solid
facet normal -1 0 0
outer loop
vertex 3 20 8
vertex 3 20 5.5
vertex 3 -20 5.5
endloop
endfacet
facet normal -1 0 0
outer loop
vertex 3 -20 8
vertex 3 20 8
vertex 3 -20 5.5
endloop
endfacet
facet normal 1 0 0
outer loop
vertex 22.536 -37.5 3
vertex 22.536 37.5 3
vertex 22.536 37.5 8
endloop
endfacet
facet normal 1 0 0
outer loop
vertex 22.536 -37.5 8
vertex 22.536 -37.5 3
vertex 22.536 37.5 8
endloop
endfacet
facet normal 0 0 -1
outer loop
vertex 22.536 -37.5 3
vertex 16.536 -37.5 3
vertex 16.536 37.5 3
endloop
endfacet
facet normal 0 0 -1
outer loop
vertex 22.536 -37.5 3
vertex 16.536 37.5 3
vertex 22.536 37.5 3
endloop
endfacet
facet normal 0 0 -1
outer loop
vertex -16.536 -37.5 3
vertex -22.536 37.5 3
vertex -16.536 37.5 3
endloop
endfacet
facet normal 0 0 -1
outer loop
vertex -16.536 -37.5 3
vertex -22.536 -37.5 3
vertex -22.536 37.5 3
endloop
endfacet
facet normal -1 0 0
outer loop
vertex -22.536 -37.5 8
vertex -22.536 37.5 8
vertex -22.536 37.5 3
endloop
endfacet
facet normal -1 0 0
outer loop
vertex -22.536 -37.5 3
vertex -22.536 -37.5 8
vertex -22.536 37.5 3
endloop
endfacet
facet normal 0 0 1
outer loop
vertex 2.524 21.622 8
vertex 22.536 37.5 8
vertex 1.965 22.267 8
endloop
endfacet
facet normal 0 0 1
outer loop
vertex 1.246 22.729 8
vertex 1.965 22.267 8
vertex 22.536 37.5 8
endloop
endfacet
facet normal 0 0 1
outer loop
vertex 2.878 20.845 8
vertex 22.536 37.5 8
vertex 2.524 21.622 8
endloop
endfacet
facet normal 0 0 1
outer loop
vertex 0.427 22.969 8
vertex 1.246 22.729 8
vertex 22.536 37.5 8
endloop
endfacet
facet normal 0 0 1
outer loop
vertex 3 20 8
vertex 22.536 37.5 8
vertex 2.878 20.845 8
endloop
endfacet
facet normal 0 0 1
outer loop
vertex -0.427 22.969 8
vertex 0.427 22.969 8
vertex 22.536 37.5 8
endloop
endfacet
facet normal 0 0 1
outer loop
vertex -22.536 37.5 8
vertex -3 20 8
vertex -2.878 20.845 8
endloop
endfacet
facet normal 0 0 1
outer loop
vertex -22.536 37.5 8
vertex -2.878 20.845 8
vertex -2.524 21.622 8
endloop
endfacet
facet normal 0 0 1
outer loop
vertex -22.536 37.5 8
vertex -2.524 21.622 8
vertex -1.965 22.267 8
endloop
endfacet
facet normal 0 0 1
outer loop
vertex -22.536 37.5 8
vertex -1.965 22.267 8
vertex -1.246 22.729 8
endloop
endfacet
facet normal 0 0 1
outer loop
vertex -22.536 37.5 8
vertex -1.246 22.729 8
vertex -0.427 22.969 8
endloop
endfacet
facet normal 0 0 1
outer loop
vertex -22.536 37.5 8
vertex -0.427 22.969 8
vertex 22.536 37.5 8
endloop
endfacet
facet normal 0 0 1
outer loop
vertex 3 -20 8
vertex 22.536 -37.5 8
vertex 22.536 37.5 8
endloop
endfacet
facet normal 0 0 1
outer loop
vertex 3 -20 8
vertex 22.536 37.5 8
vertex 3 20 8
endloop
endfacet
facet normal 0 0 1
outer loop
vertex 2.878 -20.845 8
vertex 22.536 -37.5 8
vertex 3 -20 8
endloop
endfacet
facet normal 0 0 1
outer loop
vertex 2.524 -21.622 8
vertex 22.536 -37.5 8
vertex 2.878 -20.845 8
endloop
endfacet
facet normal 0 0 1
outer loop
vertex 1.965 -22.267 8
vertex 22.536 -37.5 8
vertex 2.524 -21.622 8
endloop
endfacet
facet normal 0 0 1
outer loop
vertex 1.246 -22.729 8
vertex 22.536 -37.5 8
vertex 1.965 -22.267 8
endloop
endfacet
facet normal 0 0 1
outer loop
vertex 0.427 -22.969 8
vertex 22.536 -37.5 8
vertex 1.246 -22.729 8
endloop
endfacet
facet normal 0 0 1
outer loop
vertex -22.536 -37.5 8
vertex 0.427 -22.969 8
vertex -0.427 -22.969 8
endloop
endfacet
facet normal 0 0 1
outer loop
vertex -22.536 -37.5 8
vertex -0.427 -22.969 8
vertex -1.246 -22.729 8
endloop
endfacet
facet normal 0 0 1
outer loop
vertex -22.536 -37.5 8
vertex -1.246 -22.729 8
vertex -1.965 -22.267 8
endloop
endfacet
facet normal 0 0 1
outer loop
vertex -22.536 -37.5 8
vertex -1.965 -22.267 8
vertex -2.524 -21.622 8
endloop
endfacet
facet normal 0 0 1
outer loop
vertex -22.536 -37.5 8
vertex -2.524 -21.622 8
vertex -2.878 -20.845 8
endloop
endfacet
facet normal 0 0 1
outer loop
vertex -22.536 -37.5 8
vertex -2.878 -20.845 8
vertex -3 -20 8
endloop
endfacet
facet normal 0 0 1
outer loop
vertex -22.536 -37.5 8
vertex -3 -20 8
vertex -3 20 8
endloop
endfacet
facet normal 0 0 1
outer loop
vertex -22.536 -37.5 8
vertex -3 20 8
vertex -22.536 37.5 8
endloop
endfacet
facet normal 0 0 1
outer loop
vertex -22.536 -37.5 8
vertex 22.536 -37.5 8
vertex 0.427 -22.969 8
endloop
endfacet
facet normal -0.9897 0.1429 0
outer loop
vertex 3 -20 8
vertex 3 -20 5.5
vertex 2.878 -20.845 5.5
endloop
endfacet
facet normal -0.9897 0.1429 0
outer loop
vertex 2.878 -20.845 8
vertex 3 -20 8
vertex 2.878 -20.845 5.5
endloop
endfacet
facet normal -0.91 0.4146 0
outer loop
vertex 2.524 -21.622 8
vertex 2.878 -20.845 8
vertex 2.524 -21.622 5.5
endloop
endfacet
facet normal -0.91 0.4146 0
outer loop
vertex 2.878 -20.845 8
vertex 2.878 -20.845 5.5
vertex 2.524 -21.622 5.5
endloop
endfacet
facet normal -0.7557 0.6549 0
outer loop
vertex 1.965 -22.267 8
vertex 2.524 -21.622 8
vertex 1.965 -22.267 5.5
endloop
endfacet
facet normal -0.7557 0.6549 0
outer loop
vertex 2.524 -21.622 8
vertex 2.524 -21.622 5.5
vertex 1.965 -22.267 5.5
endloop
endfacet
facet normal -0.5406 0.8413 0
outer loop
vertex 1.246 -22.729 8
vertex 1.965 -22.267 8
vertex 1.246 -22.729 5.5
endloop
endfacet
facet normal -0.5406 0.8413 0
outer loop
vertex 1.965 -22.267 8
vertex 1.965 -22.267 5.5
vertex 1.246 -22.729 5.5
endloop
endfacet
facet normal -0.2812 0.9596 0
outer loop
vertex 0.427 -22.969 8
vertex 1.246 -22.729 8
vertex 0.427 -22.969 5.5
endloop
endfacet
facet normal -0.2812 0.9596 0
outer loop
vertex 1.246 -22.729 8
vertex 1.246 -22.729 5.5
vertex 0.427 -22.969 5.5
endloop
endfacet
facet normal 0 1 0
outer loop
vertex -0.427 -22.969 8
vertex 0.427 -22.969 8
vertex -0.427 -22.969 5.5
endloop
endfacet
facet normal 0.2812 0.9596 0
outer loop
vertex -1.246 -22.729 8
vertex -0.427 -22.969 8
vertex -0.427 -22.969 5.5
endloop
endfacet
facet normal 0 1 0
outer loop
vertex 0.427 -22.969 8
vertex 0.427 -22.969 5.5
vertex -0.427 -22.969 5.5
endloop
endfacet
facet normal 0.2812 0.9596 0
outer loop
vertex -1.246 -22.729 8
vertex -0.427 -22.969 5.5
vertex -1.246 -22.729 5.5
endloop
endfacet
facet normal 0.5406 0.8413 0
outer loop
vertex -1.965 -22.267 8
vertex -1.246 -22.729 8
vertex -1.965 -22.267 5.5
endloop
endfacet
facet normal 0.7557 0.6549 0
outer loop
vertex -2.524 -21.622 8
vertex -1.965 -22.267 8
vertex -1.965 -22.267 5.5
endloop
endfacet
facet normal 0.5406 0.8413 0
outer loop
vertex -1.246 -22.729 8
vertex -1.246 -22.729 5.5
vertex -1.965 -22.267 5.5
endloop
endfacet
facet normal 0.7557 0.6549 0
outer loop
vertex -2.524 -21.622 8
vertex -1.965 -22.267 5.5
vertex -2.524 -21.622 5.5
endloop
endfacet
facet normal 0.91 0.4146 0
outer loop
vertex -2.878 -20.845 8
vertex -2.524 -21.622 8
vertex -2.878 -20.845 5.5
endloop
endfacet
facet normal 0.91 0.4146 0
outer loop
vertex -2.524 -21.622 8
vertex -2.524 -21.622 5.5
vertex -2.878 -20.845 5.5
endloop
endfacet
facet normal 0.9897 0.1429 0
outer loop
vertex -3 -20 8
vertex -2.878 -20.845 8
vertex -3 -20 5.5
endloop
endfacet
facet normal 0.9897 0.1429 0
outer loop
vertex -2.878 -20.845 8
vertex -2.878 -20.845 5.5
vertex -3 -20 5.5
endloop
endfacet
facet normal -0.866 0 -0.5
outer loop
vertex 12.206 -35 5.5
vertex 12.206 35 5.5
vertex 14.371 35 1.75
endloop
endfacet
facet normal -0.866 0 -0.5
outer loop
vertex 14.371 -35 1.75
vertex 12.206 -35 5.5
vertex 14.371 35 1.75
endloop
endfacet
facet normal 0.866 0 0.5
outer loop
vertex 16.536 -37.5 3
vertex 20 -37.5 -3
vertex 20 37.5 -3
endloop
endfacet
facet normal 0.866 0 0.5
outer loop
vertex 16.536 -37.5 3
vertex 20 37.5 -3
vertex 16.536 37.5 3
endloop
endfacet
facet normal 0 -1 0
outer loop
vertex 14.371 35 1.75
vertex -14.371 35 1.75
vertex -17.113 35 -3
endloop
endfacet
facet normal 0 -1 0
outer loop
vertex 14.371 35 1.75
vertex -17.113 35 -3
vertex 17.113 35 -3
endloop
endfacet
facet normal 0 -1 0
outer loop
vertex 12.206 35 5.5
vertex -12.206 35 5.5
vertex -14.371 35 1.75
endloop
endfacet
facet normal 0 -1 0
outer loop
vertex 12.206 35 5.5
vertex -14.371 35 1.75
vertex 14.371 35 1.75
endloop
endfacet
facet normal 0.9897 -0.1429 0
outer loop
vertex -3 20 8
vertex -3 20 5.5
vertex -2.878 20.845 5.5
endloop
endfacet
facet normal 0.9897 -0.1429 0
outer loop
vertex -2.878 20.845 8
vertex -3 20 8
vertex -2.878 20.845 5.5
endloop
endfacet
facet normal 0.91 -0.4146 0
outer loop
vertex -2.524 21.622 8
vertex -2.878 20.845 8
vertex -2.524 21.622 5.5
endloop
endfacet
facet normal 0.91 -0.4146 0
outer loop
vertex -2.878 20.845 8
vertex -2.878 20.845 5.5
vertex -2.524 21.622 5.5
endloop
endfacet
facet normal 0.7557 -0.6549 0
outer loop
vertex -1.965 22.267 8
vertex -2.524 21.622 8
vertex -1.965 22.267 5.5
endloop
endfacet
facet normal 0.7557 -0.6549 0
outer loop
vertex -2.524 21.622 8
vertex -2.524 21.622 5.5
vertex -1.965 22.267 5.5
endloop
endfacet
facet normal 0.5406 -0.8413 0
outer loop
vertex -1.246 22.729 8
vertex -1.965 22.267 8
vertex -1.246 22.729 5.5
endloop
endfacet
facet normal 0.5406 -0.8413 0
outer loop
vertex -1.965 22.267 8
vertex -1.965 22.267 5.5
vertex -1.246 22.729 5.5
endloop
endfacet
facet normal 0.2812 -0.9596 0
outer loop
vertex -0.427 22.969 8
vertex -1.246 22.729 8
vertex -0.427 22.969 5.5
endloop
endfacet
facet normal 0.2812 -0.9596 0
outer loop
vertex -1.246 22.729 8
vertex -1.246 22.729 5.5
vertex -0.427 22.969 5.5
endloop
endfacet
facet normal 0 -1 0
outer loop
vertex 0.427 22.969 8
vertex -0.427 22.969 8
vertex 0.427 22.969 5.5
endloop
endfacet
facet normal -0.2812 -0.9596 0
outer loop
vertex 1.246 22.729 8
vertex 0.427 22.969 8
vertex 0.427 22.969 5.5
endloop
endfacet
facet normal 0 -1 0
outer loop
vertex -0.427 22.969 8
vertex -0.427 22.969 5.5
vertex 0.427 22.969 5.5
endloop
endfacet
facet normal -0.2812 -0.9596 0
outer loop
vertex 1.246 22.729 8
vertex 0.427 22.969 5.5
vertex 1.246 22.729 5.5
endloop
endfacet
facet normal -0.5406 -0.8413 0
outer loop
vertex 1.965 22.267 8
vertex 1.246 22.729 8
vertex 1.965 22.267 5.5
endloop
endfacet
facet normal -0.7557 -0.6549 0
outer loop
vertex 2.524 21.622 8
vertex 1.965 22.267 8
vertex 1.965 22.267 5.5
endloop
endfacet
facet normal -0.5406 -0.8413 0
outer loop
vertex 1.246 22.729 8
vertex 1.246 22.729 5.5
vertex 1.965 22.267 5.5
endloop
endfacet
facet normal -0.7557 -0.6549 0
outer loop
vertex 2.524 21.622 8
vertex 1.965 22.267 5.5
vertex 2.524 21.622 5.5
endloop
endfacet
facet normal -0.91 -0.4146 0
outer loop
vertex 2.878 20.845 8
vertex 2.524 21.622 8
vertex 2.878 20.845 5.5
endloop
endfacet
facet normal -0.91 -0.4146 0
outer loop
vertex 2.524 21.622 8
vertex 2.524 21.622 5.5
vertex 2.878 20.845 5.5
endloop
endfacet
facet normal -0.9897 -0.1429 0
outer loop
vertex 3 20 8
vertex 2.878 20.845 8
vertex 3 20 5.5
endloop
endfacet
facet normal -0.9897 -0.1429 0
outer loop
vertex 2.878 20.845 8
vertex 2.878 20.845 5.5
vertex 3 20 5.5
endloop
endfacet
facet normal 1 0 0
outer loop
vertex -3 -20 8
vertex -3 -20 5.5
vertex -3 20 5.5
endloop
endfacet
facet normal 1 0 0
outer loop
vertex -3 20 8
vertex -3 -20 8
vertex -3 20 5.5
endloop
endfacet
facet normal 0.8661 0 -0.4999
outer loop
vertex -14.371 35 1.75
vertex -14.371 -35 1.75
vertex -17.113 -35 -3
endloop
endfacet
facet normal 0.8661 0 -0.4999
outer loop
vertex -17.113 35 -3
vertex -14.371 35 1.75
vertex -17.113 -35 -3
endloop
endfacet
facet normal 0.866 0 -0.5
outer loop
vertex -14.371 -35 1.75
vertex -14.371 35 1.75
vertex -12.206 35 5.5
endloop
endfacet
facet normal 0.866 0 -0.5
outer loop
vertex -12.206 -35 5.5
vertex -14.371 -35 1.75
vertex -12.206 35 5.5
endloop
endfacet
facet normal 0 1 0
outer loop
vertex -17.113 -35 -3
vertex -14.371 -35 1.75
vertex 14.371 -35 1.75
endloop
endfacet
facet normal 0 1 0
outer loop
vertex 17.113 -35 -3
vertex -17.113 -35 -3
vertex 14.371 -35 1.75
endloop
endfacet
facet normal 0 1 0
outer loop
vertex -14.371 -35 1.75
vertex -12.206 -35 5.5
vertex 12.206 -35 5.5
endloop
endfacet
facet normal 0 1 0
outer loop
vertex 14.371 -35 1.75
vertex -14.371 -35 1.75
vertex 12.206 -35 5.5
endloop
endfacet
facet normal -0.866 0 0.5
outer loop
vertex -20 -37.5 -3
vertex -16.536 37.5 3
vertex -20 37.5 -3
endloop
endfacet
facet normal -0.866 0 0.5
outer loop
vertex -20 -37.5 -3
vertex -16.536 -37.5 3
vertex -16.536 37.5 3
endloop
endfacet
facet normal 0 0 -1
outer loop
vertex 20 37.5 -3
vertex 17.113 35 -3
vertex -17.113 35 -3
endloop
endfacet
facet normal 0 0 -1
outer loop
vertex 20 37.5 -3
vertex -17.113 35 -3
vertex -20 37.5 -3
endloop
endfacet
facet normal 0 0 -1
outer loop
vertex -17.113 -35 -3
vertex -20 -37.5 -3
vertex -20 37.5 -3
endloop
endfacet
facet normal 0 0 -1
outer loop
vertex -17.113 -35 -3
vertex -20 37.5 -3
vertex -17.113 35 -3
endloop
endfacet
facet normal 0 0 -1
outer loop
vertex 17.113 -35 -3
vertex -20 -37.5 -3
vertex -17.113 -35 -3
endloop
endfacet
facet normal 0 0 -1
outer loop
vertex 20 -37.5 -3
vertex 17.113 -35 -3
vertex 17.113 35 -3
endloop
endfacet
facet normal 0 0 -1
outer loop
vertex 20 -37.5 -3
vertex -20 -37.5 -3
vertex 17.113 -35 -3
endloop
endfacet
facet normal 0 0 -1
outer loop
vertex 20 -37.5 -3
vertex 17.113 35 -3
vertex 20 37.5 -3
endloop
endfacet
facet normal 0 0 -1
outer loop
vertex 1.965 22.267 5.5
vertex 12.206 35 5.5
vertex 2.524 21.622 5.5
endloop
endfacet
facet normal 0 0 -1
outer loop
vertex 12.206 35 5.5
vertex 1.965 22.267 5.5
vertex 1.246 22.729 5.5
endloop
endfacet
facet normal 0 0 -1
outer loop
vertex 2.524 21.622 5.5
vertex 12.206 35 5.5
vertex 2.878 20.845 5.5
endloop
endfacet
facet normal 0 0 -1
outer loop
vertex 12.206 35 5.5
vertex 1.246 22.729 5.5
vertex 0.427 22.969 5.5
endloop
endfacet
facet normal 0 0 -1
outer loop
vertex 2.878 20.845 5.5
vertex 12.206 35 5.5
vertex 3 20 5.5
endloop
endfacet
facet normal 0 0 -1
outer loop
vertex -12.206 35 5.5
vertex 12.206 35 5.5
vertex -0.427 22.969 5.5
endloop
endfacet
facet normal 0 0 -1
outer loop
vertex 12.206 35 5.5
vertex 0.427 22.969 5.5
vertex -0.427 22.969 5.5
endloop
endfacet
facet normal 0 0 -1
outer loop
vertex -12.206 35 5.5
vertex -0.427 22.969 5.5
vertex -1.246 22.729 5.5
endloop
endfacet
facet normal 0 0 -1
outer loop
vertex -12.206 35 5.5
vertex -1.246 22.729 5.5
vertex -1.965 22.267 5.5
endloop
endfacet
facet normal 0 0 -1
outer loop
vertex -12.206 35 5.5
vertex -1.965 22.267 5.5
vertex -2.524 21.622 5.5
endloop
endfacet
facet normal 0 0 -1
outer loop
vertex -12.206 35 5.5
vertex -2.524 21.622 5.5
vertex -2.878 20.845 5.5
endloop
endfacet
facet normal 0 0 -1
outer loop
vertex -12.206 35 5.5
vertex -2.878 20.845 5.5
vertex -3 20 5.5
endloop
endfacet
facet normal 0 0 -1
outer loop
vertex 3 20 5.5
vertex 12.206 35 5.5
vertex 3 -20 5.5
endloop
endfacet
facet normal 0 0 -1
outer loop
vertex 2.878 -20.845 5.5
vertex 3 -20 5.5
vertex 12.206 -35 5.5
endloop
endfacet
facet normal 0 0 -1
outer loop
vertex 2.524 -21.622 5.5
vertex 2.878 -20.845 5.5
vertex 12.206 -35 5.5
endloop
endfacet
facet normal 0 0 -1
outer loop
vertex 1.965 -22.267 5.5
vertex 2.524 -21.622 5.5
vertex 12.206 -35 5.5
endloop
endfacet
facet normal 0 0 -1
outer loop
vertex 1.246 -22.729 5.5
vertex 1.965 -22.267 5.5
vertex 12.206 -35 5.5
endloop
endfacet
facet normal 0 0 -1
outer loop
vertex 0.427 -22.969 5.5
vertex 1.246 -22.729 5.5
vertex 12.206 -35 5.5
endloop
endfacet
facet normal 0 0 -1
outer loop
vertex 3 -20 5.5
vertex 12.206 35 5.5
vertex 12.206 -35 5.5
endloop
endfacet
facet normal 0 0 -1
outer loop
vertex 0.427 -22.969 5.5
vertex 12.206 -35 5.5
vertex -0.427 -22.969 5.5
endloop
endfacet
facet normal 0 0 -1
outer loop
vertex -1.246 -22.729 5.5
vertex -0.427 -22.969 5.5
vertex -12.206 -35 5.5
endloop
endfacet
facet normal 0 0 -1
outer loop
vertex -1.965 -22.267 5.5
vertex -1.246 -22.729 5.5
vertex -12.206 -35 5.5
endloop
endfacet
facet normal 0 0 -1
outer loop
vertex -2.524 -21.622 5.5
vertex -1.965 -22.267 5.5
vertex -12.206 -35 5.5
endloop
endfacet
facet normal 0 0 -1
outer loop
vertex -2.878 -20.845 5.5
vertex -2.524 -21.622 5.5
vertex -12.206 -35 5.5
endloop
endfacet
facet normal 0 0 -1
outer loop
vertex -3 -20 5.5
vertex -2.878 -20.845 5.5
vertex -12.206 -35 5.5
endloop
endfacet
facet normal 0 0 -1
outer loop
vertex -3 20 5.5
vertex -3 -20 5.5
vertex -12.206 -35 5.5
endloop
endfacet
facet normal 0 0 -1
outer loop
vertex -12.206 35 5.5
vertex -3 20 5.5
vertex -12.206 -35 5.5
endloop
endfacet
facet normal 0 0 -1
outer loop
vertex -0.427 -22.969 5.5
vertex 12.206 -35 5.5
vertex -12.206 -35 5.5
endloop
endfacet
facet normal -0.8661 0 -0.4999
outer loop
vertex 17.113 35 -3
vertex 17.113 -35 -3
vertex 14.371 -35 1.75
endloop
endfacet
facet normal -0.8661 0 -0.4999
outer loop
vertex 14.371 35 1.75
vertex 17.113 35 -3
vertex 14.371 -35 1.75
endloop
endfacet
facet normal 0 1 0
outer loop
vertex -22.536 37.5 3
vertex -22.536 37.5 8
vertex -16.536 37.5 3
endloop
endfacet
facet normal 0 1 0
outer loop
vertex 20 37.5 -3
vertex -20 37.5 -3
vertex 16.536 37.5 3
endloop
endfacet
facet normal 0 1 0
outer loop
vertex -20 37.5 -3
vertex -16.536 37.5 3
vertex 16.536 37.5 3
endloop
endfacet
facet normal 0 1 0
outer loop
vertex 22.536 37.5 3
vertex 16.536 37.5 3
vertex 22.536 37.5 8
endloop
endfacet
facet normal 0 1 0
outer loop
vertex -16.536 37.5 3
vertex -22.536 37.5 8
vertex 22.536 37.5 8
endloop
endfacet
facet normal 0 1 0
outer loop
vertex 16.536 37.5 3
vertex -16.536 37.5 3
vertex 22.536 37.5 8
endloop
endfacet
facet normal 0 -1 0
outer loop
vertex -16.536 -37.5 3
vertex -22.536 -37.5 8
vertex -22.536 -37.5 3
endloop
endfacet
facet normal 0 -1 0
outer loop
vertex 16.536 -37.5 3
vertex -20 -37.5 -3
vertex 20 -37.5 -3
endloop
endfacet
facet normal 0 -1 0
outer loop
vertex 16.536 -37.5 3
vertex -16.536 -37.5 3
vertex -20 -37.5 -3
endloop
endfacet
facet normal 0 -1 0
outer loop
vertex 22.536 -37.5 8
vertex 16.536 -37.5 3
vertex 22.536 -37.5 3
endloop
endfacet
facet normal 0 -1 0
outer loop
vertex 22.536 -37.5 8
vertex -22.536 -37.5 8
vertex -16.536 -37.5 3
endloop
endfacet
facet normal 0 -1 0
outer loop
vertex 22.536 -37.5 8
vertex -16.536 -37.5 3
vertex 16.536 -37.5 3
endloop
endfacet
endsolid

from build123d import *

# Parameters (mm, degrees)
F1_DEPTH    = 37.5
F2_T        = 2.5
F2_T3_DEPTH = 80
F4_DEPTH    = 2.5


# Not quite as in the source:
# - a shell that OpenCascade refuses in one call is made with other operations: the cavity is built on its own and cut out


with BuildPart() as f1:
    # F0 (on Front) → F1 (new body, symmetric)
    with BuildSketch(Plane.XZ):
        Polygon((-20, -3), (20, -3), (16.5358983849, 3), (22.5358983849, 3), (22.5358983849, 8), (-22.5358983849, 8), (-22.5358983849, 3), (-16.5358983849, 3), align=None)
    extrude(amount=F1_DEPTH, both=True)

    # F2: shell of thickness 2.5, made by hand


with BuildPart() as f2_core1:
    # F2_t2: copy of F1
    add(f1.part)

    # the walls: a layer under each face that stays
    f2_faces = [f2_core1.faces().sort_by_distance(p)[0] for p in [
        (-18.2679491924, 0, 0),
        (-19.5358983849, 0, 3),
        (-22.5358983849, 0, 5.5),
        (0, 0, 8),
        (22.5358983849, 0, 5.5),
        (19.5358983849, 0, 3),
        (18.2679491924, 0, 0),
        (0, -37.5, 2.5),
        (0, 37.5, 2.5),
    ]]
    thicken(f2_faces, amount=-F2_T, mode=Mode.SUBTRACT)

    # F2_s4 → F2_t3 (cut)
    with BuildSketch(Plane.XZ.offset(-40)):
        Polygon((-16.55754902, 2.9875), (-14.3708348754, 1.75), (-12.2057713659, 5.5), (-16.5358983849, 5.5), align=None)
        Polygon((16.55754902, 2.9875), (16.5358983849, 5.5), (12.2057713659, 5.5), (14.3708348754, 1.75), align=None)
    extrude(amount=F2_T3_DEPTH, mode=Mode.SUBTRACT)


with BuildPart() as f1_1:
    add(f1.part)

    # what is left inside the walls is the cavity
    f2_cavity = [f2_core1.part.solids().sort_by_distance(p)[0] for p in [
        (0, 11.666667, -2.975),
    ]]
    add(f2_cavity, mode=Mode.SUBTRACT)

    # F3 (on face) → F4 (cut, through all)
    with BuildSketch(Plane(origin=(0, 0, 5.5), x_dir=(1, 0, 0), z_dir=(0, 0, -1))):
        with BuildLine():
            Line((3, -20), (3, 20))
            ThreePointArc((3, 20), (0, 23), (-3, 20))
            Line((-3, 20), (-3, -20))
            ThreePointArc((-3, -20), (0, -23), (3, -20))
        make_face()
    extrude(amount=-F4_DEPTH, mode=Mode.SUBTRACT)


solid = f1_1.part
